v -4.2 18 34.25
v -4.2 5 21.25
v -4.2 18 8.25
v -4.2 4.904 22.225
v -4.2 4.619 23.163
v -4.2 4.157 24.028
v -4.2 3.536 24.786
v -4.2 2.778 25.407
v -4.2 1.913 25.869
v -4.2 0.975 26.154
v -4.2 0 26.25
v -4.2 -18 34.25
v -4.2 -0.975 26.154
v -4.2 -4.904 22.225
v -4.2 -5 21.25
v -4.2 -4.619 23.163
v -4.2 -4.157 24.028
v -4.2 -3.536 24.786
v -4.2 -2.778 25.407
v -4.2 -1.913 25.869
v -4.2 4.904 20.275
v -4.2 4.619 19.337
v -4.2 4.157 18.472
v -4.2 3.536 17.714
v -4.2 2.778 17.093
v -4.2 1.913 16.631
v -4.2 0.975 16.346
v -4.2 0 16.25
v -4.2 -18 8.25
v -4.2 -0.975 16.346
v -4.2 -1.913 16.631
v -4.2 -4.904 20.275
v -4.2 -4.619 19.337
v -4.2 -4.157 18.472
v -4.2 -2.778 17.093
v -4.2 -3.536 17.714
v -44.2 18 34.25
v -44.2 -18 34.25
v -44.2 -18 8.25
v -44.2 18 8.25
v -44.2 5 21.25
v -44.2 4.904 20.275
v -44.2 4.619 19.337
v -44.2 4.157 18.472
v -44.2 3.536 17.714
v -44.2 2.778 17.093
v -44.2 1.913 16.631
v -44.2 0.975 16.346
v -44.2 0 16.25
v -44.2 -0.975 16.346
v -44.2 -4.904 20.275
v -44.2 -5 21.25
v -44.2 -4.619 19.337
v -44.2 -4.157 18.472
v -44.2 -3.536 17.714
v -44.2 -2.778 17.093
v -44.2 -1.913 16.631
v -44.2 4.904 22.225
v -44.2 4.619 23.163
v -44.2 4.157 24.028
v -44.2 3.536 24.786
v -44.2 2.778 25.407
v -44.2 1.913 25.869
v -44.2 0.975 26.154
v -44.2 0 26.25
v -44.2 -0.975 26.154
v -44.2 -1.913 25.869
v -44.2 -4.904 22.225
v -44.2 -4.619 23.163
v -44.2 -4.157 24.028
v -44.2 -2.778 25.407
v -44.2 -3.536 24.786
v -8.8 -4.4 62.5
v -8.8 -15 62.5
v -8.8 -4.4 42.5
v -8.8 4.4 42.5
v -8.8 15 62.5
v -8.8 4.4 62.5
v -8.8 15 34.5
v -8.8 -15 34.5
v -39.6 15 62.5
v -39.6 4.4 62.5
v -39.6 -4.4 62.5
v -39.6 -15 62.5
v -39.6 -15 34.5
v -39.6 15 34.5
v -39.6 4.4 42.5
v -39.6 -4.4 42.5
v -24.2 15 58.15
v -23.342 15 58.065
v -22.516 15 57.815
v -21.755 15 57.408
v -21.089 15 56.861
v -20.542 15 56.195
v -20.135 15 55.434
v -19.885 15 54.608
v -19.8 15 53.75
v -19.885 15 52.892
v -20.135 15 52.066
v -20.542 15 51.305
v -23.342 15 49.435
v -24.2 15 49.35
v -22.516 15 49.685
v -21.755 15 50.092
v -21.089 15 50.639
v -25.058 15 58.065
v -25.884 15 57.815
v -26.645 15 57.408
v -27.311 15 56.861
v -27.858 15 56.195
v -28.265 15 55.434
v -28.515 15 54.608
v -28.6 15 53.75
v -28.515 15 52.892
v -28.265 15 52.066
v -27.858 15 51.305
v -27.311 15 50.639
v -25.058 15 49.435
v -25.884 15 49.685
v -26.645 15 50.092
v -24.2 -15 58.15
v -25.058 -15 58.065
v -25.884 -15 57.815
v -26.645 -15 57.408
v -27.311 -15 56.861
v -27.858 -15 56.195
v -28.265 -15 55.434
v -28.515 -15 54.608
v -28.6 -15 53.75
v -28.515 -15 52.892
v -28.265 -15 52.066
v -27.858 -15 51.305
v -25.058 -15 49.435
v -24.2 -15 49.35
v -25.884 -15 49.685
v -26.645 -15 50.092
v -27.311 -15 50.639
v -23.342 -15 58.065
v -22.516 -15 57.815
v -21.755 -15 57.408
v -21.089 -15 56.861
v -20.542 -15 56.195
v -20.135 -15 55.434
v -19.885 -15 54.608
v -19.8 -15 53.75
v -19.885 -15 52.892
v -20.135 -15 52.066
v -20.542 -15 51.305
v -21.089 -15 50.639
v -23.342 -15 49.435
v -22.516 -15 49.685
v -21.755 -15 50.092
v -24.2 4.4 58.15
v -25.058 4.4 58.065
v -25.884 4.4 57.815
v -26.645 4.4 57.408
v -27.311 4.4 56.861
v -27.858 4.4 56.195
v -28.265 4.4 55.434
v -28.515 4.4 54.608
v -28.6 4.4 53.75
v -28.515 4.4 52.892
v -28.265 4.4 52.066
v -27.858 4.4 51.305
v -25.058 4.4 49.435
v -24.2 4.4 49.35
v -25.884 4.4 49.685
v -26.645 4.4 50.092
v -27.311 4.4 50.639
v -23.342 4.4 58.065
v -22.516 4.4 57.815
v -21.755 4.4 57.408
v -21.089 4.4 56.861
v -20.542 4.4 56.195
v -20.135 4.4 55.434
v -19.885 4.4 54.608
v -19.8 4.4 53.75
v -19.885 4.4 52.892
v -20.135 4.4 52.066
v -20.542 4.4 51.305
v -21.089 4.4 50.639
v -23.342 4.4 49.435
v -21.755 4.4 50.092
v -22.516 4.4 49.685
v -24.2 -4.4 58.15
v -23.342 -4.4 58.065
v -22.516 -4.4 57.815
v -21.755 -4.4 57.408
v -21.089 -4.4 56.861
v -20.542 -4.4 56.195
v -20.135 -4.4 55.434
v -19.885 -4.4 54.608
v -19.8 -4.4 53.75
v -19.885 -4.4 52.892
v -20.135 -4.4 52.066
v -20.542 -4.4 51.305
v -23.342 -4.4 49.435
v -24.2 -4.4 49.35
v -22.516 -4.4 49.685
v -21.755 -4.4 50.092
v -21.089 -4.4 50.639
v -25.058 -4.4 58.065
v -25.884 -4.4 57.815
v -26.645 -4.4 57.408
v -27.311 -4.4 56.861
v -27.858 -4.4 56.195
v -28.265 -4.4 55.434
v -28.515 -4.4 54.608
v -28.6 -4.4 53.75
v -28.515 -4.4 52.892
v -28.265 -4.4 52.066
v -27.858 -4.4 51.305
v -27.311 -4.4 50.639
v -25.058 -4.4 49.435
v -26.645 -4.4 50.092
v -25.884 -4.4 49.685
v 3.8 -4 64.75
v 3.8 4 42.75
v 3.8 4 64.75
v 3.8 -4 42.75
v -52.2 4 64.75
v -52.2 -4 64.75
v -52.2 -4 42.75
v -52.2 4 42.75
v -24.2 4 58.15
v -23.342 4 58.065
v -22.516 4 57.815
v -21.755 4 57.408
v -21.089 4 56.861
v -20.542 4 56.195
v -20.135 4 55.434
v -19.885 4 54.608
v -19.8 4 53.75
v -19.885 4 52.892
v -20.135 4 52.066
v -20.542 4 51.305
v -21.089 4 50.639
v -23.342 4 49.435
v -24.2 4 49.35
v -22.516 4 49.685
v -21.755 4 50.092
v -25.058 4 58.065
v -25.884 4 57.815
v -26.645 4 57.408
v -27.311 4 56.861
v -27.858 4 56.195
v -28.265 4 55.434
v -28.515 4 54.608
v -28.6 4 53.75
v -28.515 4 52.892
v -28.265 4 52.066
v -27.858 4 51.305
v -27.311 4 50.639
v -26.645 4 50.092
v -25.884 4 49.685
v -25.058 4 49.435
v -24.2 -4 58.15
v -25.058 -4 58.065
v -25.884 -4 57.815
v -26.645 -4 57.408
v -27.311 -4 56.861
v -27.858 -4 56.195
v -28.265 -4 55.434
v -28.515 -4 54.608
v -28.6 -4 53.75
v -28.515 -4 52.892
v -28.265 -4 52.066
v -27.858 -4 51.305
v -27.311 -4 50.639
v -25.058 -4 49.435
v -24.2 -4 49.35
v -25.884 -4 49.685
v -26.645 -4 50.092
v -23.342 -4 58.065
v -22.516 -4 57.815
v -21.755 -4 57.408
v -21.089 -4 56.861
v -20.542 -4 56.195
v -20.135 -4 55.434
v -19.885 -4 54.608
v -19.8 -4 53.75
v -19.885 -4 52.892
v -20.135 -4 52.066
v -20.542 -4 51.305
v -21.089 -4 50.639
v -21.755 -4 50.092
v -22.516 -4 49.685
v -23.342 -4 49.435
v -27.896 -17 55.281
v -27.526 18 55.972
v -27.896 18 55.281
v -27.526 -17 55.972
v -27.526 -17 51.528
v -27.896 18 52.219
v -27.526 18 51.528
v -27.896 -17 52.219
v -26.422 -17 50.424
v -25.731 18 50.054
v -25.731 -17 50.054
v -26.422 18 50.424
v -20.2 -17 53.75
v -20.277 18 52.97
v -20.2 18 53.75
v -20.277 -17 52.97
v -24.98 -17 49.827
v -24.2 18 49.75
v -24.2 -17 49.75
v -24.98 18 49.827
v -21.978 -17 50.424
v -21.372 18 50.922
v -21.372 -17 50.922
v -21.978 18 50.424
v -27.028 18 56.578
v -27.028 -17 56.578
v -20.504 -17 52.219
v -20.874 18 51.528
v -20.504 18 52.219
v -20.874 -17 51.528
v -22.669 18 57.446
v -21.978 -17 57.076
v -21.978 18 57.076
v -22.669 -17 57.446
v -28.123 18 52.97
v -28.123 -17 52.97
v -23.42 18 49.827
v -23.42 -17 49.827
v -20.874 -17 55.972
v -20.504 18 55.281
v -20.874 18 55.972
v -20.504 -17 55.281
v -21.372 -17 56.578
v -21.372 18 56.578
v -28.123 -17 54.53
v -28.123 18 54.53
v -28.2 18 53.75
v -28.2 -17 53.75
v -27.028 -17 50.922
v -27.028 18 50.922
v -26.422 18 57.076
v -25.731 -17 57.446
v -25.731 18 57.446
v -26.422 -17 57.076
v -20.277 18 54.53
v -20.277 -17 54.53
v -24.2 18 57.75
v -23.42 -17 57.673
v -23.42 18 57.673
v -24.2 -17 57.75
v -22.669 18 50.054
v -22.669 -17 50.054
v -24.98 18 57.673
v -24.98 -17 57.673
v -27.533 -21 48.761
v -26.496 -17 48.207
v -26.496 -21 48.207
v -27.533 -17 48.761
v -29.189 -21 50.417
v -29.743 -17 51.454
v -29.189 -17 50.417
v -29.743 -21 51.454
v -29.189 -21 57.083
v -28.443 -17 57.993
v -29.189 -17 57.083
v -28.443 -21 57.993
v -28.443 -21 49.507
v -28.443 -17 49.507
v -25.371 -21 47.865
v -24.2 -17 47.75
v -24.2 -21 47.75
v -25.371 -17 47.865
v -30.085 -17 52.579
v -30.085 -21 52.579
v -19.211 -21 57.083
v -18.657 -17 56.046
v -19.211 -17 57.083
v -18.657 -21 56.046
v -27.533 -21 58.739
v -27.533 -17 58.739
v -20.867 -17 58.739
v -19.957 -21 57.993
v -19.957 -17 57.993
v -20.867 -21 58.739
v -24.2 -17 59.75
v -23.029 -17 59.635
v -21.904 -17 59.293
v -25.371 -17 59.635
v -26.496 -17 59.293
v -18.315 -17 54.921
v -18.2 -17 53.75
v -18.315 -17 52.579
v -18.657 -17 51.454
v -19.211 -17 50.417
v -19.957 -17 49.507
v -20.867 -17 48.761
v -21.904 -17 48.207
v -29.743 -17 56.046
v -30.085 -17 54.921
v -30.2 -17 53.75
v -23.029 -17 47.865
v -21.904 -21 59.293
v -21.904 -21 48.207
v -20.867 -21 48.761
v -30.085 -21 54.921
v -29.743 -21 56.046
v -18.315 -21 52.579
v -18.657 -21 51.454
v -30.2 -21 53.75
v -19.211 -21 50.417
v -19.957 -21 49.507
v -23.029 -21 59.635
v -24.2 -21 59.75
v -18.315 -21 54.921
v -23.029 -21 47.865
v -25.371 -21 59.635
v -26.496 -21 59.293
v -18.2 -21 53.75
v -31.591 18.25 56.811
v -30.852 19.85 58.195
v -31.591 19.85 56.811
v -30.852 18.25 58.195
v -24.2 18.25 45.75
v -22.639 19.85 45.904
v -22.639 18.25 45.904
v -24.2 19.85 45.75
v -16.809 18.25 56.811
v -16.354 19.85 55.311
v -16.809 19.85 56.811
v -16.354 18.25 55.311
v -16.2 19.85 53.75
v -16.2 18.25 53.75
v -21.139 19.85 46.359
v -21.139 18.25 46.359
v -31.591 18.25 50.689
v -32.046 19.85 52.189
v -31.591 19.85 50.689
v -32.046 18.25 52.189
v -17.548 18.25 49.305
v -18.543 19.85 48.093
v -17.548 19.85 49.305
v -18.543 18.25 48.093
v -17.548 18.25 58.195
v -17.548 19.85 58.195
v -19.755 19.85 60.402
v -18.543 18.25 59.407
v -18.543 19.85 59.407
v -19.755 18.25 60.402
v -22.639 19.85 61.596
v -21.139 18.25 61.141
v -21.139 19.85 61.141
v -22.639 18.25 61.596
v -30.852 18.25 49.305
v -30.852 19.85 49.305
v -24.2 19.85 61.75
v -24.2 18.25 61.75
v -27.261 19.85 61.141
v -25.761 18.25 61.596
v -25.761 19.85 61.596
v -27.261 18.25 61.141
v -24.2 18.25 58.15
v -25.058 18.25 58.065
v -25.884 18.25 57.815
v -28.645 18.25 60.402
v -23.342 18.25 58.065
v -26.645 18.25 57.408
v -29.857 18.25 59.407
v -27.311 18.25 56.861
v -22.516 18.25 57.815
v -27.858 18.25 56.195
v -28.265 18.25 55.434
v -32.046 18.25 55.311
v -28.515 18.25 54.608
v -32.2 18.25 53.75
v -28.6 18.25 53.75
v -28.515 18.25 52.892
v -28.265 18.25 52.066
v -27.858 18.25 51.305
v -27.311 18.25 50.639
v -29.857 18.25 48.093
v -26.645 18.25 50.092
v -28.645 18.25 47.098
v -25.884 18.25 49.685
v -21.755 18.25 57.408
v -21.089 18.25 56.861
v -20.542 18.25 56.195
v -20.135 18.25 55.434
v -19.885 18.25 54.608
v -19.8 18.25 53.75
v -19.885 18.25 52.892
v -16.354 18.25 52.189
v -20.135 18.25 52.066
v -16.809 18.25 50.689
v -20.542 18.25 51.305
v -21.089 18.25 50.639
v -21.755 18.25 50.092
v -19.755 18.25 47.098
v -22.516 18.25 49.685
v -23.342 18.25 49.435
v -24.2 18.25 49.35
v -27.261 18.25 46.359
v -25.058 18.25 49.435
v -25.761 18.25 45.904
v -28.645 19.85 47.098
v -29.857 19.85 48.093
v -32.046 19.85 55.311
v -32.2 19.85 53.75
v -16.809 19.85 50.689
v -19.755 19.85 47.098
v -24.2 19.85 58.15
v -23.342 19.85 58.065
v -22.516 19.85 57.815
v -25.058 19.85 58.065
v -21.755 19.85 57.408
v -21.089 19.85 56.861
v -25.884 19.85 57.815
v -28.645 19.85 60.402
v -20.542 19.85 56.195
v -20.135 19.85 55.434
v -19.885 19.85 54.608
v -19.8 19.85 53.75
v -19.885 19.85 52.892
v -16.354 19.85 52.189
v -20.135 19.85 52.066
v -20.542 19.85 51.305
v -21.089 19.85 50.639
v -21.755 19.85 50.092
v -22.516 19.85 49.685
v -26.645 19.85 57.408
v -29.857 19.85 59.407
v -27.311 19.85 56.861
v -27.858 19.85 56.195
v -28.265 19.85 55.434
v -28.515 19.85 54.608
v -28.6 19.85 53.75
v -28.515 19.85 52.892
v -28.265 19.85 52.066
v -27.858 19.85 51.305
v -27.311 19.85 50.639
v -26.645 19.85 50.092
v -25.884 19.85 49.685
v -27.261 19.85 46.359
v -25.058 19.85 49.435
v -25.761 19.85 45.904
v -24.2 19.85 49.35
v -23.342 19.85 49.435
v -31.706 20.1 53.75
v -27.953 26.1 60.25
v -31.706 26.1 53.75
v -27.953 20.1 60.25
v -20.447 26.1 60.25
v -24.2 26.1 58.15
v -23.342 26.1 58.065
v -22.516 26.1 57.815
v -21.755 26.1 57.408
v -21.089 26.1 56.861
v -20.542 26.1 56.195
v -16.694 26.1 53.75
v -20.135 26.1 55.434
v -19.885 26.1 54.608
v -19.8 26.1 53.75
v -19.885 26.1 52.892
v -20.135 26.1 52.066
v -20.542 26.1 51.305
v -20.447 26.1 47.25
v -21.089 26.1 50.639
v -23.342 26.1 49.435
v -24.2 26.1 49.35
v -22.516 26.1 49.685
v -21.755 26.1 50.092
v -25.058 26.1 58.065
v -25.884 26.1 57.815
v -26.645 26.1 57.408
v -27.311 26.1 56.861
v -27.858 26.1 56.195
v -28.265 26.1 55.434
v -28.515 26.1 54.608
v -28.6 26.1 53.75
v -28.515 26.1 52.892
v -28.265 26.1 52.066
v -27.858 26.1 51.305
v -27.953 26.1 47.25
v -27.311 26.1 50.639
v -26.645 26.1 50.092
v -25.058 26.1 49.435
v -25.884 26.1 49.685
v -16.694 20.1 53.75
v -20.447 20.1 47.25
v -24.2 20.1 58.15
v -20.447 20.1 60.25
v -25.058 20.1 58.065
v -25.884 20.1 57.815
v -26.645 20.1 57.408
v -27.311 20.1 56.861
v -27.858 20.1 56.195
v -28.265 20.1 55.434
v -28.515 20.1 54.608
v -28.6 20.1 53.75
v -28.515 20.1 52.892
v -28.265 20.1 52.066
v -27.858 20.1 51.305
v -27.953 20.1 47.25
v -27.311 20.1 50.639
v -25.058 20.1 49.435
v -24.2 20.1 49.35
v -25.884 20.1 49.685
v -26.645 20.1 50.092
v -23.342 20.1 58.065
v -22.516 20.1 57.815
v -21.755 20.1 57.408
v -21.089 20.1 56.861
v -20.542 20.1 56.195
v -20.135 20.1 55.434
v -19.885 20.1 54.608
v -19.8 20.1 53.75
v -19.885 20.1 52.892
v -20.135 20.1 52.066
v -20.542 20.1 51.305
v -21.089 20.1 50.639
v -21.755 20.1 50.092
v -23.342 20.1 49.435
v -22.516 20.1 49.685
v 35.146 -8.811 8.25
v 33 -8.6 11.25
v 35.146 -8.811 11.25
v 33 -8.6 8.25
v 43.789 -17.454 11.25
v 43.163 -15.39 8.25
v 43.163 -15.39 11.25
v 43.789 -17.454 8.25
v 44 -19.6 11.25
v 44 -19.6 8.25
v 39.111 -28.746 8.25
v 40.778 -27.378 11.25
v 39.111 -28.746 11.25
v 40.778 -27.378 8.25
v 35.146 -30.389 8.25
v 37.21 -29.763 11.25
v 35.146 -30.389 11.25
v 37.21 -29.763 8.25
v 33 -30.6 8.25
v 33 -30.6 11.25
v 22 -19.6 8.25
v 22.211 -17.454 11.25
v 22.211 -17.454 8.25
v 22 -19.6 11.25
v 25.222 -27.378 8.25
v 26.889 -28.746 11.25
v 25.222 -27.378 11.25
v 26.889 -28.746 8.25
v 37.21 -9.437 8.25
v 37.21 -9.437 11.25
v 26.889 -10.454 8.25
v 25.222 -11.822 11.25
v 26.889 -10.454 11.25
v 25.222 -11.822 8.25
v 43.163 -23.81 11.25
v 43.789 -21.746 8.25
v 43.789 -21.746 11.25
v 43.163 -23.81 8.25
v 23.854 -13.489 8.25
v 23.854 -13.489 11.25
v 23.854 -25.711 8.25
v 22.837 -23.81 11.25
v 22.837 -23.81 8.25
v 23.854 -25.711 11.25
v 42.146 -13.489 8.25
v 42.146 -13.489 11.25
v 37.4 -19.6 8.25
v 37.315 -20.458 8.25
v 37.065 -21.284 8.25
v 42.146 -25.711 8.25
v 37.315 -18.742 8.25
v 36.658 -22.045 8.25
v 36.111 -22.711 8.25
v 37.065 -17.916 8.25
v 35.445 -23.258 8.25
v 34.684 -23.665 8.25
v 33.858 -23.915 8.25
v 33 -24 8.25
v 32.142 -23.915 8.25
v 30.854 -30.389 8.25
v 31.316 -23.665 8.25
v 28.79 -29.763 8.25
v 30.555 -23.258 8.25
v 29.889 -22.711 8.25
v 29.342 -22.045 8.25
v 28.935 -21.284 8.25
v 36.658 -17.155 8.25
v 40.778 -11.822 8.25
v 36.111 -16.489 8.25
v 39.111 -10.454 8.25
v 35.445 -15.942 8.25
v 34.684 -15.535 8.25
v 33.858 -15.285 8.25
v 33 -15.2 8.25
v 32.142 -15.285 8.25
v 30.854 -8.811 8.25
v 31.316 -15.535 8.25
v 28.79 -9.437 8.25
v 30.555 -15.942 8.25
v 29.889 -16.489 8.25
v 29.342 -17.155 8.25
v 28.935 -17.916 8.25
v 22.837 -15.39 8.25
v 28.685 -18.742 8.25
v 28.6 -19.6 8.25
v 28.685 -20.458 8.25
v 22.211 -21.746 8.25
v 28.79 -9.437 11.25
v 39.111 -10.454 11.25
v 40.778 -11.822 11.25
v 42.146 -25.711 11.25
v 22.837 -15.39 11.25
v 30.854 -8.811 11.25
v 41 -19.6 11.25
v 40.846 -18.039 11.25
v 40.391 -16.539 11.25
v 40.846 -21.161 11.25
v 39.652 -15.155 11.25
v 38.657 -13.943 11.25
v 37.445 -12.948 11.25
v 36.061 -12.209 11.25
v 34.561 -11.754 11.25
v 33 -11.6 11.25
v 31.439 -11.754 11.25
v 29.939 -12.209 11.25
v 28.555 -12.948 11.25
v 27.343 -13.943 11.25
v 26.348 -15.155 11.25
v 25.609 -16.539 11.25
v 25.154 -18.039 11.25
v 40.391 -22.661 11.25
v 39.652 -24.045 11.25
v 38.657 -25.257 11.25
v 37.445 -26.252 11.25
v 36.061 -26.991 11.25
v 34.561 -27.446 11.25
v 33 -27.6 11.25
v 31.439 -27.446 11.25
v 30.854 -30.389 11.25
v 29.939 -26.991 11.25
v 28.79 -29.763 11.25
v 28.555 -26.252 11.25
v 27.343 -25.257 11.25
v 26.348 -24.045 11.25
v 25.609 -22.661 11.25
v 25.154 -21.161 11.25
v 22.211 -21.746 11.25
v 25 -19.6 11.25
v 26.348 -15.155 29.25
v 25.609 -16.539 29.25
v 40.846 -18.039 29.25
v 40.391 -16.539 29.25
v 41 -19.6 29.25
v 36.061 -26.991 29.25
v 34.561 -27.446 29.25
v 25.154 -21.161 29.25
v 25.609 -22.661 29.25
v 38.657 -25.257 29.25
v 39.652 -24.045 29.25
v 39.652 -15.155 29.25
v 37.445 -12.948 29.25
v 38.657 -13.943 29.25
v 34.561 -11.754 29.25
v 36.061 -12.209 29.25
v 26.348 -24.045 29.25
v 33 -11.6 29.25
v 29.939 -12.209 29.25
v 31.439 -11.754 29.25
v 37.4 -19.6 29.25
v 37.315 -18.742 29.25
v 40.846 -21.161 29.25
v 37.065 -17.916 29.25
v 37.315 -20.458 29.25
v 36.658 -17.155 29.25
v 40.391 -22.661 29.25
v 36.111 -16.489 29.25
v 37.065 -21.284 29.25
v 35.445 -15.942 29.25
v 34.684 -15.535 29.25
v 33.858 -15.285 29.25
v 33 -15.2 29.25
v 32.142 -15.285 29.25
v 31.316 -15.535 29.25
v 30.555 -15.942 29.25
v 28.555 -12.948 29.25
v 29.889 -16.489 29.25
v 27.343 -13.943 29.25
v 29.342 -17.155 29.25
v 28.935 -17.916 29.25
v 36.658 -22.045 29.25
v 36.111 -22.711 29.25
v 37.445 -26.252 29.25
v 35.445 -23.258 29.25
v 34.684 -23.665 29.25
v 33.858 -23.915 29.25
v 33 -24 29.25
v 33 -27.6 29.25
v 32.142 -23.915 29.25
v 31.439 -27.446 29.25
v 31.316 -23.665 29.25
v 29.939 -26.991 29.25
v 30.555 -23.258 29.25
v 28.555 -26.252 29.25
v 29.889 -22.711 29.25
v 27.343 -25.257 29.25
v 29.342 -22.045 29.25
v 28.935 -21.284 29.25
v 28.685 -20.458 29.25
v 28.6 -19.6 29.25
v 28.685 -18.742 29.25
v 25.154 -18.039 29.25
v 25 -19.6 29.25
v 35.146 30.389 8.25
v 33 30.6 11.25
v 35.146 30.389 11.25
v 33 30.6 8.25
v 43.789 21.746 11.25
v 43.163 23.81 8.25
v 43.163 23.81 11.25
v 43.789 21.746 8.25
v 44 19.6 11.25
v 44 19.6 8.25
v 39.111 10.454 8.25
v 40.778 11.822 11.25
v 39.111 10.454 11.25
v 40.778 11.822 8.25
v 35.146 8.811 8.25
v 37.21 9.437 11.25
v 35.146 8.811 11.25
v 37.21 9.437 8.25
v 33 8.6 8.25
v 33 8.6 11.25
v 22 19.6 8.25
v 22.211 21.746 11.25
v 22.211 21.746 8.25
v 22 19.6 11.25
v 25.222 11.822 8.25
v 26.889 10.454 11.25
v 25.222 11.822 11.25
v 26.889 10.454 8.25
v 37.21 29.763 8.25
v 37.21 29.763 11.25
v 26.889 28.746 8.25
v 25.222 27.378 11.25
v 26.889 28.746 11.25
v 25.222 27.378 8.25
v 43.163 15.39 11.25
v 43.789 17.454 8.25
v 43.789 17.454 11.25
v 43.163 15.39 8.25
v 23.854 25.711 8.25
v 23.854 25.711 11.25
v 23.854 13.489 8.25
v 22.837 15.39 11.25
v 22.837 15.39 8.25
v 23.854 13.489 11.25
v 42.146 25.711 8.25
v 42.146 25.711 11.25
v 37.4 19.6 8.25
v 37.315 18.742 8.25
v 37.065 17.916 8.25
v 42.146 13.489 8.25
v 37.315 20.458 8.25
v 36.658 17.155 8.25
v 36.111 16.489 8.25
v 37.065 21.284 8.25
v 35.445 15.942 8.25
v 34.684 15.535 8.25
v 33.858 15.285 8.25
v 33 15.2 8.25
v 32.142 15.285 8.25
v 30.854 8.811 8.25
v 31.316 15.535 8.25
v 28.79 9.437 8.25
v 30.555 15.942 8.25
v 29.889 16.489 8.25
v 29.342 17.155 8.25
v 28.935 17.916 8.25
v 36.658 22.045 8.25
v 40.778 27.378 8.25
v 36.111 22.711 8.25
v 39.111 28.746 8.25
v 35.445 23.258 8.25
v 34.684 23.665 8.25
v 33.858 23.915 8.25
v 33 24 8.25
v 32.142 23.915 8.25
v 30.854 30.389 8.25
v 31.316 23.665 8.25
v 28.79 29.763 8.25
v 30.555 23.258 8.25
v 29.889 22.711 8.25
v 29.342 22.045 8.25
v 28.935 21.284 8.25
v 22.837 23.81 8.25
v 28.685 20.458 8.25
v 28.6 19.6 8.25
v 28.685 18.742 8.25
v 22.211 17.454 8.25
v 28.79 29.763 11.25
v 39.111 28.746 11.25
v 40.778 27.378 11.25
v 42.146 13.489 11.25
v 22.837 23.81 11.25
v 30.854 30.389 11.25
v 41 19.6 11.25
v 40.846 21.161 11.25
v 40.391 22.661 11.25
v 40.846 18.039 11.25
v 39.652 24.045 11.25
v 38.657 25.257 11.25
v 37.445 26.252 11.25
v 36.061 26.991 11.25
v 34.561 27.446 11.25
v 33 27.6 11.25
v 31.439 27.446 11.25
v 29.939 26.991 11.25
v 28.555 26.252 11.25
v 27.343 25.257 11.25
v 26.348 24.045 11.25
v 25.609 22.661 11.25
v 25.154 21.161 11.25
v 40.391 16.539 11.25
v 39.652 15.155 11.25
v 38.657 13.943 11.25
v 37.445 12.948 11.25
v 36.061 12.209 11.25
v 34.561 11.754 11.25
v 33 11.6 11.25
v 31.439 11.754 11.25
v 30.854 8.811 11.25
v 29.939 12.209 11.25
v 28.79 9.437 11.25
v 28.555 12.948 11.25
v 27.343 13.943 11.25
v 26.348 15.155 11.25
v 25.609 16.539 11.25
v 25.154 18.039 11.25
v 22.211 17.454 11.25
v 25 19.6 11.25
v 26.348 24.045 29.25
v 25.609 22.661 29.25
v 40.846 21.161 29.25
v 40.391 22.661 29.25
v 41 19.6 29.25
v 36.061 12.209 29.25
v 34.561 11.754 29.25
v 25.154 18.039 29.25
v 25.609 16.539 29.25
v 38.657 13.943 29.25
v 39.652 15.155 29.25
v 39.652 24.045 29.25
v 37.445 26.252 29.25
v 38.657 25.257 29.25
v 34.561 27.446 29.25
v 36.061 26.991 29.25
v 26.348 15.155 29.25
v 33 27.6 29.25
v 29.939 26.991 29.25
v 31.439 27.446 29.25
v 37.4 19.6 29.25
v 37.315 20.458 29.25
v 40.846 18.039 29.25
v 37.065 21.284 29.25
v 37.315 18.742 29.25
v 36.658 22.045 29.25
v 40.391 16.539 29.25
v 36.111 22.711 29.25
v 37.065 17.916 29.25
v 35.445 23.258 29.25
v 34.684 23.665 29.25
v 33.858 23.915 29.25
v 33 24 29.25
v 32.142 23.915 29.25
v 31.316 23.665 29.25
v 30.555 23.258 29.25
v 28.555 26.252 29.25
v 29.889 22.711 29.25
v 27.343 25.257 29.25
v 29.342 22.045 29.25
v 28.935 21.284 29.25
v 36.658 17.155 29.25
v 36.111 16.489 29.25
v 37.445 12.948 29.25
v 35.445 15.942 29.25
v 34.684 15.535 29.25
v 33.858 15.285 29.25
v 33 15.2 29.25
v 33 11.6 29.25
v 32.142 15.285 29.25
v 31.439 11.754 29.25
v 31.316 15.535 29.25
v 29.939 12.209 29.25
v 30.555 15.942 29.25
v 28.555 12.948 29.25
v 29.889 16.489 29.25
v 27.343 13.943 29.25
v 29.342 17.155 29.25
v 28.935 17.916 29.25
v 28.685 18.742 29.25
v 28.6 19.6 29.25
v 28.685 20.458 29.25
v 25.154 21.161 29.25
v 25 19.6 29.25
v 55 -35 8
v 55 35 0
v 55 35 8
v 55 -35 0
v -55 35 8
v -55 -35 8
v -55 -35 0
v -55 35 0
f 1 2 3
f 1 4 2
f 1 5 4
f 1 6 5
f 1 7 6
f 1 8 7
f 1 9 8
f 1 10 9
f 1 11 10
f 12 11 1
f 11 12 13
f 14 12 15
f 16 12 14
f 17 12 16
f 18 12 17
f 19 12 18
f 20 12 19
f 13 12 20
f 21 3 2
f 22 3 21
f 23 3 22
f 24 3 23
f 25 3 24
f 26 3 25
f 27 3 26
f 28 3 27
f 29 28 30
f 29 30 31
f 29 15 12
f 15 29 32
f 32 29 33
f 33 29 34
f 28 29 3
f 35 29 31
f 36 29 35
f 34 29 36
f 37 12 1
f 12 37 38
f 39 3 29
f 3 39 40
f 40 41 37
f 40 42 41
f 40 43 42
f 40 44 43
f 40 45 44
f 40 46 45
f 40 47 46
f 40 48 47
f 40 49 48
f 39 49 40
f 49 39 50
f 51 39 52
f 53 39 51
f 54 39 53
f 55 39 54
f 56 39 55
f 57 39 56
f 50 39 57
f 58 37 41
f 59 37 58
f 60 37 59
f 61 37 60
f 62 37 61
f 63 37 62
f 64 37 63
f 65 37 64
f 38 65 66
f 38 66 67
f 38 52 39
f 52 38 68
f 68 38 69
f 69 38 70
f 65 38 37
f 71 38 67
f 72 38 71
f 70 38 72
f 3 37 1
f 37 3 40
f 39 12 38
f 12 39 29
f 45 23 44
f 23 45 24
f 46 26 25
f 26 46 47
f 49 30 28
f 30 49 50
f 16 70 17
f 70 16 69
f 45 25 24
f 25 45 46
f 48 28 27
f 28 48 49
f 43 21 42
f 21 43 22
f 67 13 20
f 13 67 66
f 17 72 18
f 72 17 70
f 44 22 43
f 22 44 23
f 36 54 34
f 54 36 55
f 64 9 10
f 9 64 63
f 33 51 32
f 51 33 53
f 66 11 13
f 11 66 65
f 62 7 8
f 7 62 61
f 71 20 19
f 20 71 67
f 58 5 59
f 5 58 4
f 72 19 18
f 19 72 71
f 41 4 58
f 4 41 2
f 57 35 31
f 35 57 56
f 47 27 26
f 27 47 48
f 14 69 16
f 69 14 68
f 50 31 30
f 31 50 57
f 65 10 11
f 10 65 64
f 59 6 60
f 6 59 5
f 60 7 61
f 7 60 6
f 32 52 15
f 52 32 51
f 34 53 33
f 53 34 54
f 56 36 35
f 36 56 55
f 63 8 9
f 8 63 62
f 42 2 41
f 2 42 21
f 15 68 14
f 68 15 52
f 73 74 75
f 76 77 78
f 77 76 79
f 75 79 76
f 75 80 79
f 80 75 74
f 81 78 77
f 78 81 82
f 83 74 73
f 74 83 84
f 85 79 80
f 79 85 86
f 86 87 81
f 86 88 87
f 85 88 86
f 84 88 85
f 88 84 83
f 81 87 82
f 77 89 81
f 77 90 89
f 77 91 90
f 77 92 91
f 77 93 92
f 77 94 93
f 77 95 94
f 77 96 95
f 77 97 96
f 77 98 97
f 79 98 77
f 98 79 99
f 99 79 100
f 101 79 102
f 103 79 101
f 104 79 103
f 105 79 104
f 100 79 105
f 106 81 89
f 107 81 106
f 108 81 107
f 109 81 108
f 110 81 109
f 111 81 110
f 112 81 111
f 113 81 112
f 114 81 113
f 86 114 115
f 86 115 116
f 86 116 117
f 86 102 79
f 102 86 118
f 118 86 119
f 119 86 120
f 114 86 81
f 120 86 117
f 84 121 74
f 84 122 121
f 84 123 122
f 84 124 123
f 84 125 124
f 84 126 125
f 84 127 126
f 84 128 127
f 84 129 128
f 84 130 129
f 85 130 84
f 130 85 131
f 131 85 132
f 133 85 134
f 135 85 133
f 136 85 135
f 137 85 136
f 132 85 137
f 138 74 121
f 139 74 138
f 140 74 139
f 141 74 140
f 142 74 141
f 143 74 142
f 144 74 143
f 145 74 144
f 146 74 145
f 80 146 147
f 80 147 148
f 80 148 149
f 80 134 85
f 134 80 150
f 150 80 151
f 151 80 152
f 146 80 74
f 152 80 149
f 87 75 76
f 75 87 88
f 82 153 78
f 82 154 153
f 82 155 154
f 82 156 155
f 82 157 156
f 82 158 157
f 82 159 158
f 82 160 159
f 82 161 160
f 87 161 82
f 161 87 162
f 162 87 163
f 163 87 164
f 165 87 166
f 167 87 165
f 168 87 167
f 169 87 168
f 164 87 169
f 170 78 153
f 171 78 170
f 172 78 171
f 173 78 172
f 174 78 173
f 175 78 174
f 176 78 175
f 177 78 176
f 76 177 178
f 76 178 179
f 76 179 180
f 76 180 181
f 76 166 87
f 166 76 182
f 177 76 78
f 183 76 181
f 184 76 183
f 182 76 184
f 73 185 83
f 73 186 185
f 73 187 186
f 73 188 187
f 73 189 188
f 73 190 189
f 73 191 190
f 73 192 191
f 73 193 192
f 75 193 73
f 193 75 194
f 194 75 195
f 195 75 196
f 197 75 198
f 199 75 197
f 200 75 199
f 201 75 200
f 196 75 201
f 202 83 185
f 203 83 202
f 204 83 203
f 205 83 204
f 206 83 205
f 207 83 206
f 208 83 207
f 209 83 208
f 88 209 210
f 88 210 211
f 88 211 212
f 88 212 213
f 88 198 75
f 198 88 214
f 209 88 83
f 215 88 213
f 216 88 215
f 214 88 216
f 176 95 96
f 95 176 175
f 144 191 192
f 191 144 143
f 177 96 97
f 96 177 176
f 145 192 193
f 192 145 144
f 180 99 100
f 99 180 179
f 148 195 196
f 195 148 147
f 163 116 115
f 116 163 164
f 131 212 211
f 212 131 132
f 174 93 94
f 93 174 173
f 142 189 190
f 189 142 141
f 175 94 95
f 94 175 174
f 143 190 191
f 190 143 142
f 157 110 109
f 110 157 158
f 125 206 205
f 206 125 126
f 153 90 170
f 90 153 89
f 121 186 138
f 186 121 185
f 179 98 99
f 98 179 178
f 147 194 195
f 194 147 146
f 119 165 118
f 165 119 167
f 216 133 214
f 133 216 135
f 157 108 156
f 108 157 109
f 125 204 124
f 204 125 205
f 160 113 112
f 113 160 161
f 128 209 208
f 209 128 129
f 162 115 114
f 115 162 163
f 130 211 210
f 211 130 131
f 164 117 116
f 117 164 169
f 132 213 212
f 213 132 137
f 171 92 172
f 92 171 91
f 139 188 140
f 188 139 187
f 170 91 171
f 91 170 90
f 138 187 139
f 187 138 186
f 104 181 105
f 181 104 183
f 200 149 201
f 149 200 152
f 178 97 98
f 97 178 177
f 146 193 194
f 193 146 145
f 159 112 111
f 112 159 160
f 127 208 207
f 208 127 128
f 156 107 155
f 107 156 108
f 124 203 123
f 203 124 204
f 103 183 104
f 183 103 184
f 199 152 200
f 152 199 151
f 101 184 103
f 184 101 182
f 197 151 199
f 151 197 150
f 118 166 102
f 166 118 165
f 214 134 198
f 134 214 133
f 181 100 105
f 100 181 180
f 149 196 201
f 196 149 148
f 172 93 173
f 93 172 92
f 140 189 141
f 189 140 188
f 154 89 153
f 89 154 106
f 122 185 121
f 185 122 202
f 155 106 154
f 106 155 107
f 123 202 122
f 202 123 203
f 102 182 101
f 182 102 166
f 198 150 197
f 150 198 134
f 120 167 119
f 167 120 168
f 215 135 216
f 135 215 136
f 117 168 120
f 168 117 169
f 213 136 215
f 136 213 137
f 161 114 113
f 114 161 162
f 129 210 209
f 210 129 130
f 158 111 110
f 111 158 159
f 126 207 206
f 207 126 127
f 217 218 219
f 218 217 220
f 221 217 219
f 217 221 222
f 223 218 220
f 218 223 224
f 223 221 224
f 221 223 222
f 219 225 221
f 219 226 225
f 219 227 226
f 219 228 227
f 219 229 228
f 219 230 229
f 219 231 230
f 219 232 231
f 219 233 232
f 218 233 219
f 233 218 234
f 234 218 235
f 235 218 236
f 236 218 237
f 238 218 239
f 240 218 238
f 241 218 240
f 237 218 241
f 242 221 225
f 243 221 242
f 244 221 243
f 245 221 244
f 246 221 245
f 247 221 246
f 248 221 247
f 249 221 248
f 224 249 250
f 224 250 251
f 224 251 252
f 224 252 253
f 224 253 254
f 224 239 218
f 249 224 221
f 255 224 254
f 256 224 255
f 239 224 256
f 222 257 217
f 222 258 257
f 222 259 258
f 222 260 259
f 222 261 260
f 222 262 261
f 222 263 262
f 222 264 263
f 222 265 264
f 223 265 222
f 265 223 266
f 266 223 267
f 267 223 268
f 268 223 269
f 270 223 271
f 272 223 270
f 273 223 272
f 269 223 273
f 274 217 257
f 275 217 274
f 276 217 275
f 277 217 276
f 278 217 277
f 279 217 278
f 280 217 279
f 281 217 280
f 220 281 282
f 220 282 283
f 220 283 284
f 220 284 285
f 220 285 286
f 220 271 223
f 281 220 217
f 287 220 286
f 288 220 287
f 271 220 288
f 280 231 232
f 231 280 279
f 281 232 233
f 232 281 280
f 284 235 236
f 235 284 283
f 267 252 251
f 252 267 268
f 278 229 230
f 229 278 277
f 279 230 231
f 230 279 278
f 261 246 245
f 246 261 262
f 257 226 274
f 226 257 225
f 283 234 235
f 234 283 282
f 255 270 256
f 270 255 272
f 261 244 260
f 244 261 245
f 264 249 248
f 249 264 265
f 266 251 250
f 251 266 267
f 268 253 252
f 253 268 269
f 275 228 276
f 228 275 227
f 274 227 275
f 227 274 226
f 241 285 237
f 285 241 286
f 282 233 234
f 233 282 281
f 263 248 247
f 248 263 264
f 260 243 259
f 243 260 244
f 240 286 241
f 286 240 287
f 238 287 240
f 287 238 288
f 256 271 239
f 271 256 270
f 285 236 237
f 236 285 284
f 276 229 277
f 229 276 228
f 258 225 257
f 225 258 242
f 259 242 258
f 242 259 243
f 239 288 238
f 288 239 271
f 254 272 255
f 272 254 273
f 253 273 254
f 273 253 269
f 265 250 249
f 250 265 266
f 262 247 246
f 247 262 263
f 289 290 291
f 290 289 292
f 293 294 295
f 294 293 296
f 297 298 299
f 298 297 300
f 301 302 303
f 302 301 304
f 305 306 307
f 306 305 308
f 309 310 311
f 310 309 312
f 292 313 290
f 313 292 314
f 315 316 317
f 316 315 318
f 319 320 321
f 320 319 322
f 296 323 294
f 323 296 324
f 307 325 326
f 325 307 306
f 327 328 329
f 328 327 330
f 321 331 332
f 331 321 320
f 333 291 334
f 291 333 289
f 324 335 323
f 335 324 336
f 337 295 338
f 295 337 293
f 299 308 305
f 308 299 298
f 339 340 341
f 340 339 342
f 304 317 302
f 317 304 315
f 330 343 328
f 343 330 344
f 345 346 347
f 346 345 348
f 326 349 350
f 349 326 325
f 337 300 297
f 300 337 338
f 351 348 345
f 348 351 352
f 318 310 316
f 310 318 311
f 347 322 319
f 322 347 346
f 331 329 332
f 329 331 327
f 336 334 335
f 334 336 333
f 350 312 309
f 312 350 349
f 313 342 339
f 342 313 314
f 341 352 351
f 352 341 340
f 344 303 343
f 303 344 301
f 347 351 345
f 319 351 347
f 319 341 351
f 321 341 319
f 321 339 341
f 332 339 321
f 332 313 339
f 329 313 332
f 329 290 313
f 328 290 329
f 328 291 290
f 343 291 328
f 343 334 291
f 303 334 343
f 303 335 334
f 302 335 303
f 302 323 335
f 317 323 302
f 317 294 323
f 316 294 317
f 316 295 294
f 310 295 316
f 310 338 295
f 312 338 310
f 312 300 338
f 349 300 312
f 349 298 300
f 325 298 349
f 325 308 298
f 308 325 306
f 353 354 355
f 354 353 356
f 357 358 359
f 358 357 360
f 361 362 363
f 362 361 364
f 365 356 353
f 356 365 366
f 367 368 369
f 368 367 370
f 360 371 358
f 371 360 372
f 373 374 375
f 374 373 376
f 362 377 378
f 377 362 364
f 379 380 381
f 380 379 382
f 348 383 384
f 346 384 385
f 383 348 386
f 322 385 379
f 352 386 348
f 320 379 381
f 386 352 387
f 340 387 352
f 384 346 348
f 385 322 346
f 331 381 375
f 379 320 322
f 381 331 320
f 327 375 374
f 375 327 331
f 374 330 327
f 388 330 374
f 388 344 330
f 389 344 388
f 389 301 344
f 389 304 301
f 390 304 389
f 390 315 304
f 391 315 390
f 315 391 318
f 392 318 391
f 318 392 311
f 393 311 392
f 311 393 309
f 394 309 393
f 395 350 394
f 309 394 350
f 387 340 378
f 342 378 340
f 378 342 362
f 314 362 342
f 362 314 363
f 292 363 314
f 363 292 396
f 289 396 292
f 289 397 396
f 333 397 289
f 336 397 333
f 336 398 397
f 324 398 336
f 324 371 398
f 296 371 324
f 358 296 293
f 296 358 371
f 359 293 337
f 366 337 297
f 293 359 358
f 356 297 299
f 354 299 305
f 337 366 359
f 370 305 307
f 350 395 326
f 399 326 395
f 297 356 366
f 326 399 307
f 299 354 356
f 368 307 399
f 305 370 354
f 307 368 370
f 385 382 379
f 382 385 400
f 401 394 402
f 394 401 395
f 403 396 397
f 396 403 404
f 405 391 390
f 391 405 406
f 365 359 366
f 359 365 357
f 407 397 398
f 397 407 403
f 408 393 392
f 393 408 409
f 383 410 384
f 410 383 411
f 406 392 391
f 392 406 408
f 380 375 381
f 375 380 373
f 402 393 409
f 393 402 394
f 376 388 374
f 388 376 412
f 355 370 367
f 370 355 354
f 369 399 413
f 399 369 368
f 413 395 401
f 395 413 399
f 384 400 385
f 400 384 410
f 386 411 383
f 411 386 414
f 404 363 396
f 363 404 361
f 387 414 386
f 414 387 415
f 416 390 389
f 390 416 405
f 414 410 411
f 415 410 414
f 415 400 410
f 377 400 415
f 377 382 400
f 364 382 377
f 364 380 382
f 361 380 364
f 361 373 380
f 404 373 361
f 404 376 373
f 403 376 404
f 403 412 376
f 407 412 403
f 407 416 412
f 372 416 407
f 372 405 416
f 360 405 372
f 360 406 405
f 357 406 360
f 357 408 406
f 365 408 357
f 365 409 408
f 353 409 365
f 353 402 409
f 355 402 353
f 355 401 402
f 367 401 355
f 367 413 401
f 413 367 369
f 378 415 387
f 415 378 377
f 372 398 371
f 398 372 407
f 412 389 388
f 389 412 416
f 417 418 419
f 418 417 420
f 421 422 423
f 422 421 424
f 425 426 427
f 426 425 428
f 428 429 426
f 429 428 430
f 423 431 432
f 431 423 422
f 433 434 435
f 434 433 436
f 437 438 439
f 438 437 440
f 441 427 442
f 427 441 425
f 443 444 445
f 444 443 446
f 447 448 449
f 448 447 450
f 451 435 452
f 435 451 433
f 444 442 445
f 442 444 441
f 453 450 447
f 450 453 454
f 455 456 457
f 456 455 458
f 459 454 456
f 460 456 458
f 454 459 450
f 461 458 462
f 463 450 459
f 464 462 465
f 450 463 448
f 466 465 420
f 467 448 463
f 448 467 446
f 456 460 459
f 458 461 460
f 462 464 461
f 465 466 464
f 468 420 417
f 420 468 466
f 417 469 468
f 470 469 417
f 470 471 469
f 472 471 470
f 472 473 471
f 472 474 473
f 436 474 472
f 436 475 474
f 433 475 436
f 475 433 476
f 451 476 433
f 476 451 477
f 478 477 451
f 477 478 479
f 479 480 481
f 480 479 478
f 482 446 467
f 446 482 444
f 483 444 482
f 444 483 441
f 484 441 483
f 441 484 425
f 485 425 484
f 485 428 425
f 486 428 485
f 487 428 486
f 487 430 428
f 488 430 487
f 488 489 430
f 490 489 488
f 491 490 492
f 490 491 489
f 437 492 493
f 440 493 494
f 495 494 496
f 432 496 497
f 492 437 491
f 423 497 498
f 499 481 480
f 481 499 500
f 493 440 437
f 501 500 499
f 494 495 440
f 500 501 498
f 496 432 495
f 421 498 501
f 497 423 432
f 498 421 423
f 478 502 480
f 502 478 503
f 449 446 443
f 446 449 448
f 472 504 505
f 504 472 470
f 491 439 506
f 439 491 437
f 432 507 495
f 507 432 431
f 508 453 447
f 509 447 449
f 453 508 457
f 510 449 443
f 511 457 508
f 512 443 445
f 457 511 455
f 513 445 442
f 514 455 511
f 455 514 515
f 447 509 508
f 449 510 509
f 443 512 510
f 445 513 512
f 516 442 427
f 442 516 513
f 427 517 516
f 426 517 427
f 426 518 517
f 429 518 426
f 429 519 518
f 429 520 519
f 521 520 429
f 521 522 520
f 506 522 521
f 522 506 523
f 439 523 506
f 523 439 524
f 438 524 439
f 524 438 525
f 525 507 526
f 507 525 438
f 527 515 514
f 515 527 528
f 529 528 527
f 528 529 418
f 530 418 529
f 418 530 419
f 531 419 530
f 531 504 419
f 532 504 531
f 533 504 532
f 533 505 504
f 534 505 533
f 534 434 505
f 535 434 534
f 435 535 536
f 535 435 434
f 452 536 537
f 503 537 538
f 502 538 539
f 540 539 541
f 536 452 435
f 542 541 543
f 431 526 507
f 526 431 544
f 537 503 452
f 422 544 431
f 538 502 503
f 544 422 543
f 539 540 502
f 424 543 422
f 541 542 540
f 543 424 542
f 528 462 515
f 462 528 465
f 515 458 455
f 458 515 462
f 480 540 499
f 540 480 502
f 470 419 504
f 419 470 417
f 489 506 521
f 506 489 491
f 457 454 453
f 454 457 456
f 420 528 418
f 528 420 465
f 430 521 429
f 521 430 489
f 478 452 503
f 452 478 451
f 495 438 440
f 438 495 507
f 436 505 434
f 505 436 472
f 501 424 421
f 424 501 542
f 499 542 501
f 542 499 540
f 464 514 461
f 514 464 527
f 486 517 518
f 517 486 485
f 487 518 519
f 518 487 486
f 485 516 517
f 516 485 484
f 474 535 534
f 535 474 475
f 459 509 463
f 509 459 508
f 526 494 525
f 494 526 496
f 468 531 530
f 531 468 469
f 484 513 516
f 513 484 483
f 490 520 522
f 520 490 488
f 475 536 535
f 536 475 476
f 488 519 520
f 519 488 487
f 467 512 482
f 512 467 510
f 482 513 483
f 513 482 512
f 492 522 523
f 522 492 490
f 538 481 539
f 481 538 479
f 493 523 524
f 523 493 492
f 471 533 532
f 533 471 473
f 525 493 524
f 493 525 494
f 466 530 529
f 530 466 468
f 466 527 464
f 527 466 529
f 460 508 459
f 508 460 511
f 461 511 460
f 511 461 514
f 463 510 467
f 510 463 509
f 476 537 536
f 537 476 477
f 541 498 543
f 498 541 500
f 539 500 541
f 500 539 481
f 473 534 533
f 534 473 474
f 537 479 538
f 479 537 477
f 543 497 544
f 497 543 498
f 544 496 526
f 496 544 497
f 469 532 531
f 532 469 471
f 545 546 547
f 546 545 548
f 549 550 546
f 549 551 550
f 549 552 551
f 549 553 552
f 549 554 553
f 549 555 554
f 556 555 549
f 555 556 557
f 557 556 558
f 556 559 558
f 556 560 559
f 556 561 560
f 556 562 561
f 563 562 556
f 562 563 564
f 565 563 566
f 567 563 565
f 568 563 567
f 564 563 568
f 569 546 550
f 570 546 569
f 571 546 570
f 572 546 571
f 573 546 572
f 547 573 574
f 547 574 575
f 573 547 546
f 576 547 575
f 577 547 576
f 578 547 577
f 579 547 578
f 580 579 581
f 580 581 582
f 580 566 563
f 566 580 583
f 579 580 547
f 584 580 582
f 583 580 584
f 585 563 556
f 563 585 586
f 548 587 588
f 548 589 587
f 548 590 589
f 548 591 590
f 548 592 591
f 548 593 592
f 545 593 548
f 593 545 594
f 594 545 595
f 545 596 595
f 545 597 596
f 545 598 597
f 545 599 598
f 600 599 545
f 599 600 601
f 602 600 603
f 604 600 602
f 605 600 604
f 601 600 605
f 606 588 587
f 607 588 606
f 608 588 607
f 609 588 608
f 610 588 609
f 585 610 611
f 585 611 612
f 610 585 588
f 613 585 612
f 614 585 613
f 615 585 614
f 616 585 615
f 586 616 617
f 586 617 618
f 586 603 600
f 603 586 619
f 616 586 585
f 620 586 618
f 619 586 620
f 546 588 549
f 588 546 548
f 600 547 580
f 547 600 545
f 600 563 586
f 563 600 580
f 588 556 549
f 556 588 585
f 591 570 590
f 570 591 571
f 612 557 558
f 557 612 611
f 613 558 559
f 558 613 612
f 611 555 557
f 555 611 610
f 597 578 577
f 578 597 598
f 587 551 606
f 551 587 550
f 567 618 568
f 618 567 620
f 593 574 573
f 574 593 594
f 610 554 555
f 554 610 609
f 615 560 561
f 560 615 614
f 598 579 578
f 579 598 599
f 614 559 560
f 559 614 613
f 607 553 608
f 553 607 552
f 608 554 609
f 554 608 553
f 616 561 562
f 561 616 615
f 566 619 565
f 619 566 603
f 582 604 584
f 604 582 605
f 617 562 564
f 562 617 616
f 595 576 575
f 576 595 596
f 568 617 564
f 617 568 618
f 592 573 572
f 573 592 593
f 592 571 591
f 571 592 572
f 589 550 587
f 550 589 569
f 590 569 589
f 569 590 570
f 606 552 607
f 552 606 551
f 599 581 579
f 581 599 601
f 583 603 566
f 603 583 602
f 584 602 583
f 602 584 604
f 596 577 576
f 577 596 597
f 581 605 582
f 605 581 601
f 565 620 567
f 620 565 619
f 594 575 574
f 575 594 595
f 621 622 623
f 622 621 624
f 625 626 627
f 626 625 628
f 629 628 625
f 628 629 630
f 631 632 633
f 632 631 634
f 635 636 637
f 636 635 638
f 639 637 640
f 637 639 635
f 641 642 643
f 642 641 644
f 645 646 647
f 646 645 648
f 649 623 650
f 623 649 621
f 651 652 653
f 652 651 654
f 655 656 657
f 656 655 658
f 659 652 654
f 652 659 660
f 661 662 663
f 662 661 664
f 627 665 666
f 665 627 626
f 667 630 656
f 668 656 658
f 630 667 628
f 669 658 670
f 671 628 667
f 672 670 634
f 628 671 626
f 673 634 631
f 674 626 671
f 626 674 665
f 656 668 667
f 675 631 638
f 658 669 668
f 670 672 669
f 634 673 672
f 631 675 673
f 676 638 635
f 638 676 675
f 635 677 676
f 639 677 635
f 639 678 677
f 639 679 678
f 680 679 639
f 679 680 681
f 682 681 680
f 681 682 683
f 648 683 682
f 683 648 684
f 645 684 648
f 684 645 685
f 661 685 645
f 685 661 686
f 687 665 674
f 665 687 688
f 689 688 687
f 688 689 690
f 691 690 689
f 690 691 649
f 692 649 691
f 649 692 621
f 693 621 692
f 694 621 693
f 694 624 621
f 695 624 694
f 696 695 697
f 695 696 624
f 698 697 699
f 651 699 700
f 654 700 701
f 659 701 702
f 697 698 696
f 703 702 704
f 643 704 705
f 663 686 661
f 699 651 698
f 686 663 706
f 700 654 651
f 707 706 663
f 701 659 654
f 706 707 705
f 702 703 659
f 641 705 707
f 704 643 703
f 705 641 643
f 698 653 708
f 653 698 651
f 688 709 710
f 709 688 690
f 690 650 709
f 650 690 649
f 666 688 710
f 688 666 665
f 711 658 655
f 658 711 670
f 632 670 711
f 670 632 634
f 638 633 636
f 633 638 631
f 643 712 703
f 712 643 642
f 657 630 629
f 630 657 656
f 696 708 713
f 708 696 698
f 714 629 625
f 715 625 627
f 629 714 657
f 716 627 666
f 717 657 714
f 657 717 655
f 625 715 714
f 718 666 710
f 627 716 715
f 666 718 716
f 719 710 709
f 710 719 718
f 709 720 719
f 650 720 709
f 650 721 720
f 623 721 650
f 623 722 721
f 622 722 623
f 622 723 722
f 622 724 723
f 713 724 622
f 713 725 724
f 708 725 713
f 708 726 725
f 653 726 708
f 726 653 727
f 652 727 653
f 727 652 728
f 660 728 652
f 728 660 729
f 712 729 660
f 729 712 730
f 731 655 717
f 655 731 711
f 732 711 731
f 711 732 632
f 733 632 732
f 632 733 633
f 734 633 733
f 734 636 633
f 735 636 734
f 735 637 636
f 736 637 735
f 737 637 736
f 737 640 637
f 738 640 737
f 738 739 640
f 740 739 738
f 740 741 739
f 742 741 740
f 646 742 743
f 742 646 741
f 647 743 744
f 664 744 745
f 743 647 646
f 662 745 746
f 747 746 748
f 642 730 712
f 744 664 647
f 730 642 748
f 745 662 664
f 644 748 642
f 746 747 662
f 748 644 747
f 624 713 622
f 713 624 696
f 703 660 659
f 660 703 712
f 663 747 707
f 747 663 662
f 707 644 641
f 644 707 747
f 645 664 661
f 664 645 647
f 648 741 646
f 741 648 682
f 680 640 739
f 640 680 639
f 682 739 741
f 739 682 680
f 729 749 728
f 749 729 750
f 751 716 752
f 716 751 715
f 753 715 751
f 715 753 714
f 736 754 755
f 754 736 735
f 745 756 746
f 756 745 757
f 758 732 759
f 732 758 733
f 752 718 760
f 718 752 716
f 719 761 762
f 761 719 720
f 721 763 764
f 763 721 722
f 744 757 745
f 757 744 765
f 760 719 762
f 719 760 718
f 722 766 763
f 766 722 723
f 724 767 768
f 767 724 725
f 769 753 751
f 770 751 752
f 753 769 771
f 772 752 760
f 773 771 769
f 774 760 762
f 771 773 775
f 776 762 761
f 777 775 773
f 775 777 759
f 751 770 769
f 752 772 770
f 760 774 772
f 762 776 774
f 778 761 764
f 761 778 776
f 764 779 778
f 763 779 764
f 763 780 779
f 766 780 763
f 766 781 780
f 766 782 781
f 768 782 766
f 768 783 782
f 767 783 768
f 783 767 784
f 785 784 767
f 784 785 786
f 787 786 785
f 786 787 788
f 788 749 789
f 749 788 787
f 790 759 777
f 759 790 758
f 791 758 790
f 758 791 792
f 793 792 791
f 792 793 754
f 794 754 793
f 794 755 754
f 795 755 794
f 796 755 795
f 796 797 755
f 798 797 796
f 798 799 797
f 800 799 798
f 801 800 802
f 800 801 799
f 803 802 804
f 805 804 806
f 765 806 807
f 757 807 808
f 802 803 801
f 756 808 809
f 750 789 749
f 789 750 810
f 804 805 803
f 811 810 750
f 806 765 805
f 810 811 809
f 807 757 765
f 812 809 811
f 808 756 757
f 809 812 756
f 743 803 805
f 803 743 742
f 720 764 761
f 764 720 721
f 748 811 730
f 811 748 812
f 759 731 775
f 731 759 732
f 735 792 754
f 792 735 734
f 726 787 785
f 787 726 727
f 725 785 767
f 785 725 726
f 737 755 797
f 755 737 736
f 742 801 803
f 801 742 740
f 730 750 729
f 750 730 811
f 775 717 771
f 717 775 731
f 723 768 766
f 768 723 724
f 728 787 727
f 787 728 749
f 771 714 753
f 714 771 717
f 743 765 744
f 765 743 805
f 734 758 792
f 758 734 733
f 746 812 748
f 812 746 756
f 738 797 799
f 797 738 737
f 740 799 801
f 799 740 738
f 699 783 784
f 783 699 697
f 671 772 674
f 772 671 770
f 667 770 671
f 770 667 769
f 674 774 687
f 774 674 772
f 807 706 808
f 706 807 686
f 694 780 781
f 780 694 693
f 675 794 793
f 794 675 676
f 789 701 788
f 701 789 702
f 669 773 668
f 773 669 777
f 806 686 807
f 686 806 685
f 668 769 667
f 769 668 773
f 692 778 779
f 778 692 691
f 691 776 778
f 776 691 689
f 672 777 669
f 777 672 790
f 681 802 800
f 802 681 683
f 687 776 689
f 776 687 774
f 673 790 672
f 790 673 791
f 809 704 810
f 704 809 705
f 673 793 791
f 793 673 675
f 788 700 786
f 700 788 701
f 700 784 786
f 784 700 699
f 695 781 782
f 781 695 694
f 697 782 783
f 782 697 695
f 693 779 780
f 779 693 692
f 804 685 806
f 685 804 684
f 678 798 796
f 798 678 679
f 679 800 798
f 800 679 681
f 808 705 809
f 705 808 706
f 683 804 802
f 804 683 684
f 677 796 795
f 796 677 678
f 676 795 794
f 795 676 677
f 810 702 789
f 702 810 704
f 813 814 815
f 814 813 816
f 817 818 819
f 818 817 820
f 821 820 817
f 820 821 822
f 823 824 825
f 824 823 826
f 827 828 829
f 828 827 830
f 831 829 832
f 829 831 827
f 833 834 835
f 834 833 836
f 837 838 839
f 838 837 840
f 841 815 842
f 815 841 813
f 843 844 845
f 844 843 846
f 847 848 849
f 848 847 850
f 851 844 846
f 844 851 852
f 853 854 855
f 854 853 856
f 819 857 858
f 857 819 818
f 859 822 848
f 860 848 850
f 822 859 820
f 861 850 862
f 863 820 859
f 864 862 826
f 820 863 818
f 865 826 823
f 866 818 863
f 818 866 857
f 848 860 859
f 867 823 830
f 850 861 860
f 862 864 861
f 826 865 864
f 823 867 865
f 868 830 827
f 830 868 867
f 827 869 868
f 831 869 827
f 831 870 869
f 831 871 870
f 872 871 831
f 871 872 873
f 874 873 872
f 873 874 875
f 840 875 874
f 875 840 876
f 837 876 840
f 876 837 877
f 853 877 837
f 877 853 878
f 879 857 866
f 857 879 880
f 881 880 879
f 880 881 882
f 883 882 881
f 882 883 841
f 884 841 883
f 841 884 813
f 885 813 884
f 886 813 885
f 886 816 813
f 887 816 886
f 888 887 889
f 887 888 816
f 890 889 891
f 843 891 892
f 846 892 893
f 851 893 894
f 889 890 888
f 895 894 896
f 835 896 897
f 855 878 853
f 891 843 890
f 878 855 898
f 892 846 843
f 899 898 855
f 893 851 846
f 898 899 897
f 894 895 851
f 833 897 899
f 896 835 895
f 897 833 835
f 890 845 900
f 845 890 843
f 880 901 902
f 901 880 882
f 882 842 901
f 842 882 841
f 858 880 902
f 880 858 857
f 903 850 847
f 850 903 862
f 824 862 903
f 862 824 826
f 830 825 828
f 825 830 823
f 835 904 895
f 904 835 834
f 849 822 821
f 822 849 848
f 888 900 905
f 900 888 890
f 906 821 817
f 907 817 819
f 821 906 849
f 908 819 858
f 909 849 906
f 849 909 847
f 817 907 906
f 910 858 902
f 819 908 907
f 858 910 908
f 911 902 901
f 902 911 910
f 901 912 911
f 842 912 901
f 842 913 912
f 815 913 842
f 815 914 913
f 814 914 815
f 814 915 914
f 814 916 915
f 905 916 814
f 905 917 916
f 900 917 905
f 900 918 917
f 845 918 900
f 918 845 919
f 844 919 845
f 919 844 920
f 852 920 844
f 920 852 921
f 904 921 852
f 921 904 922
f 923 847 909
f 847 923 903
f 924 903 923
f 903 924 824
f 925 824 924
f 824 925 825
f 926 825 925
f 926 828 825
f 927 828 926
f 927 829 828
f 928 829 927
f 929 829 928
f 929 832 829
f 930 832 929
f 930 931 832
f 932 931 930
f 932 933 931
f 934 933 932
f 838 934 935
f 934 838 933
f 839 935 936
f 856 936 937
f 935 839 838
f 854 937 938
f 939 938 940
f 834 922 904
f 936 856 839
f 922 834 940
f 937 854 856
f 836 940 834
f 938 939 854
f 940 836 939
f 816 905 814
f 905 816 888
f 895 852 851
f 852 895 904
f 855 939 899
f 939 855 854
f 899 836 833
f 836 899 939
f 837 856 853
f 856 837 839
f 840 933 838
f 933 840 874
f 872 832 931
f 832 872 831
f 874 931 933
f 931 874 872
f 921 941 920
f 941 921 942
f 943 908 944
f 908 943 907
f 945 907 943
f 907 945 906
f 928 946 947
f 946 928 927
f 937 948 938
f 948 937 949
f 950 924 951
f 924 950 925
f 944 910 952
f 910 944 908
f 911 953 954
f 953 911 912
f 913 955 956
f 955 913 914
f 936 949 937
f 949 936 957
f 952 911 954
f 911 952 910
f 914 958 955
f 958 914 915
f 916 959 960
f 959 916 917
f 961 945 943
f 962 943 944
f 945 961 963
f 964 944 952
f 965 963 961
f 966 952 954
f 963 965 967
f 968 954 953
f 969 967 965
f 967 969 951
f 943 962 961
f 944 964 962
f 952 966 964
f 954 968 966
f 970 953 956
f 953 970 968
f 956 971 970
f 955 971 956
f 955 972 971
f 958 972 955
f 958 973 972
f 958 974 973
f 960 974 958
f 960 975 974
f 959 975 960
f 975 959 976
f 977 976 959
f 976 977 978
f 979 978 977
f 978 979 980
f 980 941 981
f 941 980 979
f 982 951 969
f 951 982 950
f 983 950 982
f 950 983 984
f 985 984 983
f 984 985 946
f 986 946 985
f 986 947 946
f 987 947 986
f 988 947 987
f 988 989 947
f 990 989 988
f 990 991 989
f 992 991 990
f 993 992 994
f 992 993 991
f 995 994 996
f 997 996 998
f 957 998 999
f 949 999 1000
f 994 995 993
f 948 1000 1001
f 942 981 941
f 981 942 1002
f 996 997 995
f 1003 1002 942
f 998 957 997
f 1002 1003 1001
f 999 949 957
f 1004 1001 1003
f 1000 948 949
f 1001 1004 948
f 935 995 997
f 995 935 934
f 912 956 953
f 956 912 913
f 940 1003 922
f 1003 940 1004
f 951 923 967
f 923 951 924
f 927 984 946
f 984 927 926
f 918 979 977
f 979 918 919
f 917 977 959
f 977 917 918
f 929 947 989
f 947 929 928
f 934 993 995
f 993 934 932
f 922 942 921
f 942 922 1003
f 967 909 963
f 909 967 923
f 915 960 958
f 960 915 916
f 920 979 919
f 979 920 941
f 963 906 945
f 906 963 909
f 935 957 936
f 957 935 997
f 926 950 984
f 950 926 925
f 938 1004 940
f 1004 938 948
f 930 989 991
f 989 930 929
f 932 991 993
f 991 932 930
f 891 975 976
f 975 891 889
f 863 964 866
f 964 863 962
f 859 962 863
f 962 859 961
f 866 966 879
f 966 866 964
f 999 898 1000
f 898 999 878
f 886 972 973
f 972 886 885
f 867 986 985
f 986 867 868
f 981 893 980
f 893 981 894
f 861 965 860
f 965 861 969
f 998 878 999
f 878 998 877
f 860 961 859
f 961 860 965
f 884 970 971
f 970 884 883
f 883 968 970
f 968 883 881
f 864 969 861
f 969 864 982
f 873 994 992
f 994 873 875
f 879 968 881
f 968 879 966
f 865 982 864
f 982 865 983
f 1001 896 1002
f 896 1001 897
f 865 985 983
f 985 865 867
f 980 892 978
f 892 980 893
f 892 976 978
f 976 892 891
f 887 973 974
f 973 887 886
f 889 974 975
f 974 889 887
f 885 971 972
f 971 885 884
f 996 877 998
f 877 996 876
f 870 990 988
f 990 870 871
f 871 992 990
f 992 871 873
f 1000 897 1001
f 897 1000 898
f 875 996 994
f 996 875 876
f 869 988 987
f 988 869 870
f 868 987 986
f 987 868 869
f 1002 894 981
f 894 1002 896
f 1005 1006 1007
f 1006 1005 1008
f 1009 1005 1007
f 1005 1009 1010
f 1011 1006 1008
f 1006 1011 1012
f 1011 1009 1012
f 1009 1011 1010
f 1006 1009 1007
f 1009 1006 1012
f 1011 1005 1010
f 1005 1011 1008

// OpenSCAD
$fn = 32;

// ------------------------------------------------------------------------
// Indexing jig: plate 110 x 70 mm, pin d8
// Every part is its own module, assembly() places every instance.
// ------------------------------------------------------------------------

// --- part 1 ---
module jig_plate() {
  difference() {
    translate([-55, -35, 0]) cube([110, 70, 8]);
  }
}

// --- part 2 ---
module locator_block() {
  difference() {
    translate([-20, -18, 0]) cube([40, 36, 26]);
    translate([0, 0, 13]) rotate([0, 90, 0]) cylinder(h = 42, d = 10, center = true);
  }
}

// --- part 3 ---
module index_fork() {
  difference() {
    translate([-15.4, -15, 0]) cube([30.8, 30, 28]);
    translate([-16.4, -4.4, 8]) cube([32.8, 8.8, 21]);
    translate([0, 0, 19.25]) rotate([90, 0, 0]) cylinder(h = 32, d = 8.8, center = true);
  }
}

// --- part 4 ---
module index_arm() {
  difference() {
    translate([-28, -4, 0]) cube([56, 8, 22]);
    translate([0, 0, 11]) rotate([90, 0, 0]) cylinder(h = 10, d = 8.8, center = true);
  }
}

// --- part 5 ---
module index_pin() {
  rotate([0, 90, 0]) cylinder(h = 36, d = 8, center = true);
  translate([-21, 0, 0]) rotate([0, 90, 0]) cylinder(h = 4, d = 12);
}

// --- part 6 ---
module pin_washer() {
  difference() {
      translate([0, 0, 0]) cylinder(h = 1.6, d = 16);
      translate([0, 0, -1]) cylinder(h = 3.6, d = 8.8);
    }
}

// --- part 7 ---
module lock_nut() {
  difference() {
    linear_extrude(height = 6) polygon(points = [[7.506, 0], [3.753, 6.5], [-3.753, 6.5], [-7.506, 0], [-3.753, -6.5], [3.753, -6.5]]);
    translate([0, 0, -1]) cylinder(h = 8, d = 8.8);
  }
}

// --- part 8 ---
module guide_bush_a() {
  difference() {
    union() {
      cylinder(h = 3, d = 22);
      translate([0, 0, 3]) cylinder(h = 18, d = 16);
    }
    translate([0, 0, -1]) cylinder(h = 23, d = 8.8);
  }
}

// --- part 9 ---
module guide_bush_b() {
  difference() {
    union() {
      cylinder(h = 3, d = 22);
      translate([0, 0, 3]) cylinder(h = 18, d = 16);
    }
    translate([0, 0, -1]) cylinder(h = 23, d = 8.8);
  }
}

// --- assembly ---
module assembly() {
  color([0.80, 0.24, 0.20]) translate([0, 0, 0]) rotate([0, 0, 0]) jig_plate();
  color([0.20, 0.45, 0.75]) translate([-24.2, 0, 8.25]) rotate([0, 0, 0]) locator_block();
  color([0.25, 0.62, 0.32]) translate([-24.2, 0, 34.5]) rotate([0, 0, 0]) index_fork();
  color([0.92, 0.70, 0.18]) translate([-24.2, 0, 42.75]) rotate([0, 0, 0]) index_arm();
  color([0.58, 0.35, 0.70]) translate([-24.2, 0, 53.75]) rotate([0, 0, 90]) index_pin();
  color([0.16, 0.66, 0.66]) translate([-24.2, 19.85, 53.75]) rotate([90, 0, 0]) pin_washer();
  color([0.85, 0.48, 0.18]) translate([-24.2, 26.1, 53.75]) rotate([90, 0, 0]) lock_nut();
  color([0.55, 0.60, 0.65]) translate([33, -19.6, 8.25]) rotate([0, 0, 0]) guide_bush_a();
  color([0.75, 0.30, 0.55]) translate([33, 19.6, 8.25]) rotate([0, 0, 0]) guide_bush_b();
}

assembly();
